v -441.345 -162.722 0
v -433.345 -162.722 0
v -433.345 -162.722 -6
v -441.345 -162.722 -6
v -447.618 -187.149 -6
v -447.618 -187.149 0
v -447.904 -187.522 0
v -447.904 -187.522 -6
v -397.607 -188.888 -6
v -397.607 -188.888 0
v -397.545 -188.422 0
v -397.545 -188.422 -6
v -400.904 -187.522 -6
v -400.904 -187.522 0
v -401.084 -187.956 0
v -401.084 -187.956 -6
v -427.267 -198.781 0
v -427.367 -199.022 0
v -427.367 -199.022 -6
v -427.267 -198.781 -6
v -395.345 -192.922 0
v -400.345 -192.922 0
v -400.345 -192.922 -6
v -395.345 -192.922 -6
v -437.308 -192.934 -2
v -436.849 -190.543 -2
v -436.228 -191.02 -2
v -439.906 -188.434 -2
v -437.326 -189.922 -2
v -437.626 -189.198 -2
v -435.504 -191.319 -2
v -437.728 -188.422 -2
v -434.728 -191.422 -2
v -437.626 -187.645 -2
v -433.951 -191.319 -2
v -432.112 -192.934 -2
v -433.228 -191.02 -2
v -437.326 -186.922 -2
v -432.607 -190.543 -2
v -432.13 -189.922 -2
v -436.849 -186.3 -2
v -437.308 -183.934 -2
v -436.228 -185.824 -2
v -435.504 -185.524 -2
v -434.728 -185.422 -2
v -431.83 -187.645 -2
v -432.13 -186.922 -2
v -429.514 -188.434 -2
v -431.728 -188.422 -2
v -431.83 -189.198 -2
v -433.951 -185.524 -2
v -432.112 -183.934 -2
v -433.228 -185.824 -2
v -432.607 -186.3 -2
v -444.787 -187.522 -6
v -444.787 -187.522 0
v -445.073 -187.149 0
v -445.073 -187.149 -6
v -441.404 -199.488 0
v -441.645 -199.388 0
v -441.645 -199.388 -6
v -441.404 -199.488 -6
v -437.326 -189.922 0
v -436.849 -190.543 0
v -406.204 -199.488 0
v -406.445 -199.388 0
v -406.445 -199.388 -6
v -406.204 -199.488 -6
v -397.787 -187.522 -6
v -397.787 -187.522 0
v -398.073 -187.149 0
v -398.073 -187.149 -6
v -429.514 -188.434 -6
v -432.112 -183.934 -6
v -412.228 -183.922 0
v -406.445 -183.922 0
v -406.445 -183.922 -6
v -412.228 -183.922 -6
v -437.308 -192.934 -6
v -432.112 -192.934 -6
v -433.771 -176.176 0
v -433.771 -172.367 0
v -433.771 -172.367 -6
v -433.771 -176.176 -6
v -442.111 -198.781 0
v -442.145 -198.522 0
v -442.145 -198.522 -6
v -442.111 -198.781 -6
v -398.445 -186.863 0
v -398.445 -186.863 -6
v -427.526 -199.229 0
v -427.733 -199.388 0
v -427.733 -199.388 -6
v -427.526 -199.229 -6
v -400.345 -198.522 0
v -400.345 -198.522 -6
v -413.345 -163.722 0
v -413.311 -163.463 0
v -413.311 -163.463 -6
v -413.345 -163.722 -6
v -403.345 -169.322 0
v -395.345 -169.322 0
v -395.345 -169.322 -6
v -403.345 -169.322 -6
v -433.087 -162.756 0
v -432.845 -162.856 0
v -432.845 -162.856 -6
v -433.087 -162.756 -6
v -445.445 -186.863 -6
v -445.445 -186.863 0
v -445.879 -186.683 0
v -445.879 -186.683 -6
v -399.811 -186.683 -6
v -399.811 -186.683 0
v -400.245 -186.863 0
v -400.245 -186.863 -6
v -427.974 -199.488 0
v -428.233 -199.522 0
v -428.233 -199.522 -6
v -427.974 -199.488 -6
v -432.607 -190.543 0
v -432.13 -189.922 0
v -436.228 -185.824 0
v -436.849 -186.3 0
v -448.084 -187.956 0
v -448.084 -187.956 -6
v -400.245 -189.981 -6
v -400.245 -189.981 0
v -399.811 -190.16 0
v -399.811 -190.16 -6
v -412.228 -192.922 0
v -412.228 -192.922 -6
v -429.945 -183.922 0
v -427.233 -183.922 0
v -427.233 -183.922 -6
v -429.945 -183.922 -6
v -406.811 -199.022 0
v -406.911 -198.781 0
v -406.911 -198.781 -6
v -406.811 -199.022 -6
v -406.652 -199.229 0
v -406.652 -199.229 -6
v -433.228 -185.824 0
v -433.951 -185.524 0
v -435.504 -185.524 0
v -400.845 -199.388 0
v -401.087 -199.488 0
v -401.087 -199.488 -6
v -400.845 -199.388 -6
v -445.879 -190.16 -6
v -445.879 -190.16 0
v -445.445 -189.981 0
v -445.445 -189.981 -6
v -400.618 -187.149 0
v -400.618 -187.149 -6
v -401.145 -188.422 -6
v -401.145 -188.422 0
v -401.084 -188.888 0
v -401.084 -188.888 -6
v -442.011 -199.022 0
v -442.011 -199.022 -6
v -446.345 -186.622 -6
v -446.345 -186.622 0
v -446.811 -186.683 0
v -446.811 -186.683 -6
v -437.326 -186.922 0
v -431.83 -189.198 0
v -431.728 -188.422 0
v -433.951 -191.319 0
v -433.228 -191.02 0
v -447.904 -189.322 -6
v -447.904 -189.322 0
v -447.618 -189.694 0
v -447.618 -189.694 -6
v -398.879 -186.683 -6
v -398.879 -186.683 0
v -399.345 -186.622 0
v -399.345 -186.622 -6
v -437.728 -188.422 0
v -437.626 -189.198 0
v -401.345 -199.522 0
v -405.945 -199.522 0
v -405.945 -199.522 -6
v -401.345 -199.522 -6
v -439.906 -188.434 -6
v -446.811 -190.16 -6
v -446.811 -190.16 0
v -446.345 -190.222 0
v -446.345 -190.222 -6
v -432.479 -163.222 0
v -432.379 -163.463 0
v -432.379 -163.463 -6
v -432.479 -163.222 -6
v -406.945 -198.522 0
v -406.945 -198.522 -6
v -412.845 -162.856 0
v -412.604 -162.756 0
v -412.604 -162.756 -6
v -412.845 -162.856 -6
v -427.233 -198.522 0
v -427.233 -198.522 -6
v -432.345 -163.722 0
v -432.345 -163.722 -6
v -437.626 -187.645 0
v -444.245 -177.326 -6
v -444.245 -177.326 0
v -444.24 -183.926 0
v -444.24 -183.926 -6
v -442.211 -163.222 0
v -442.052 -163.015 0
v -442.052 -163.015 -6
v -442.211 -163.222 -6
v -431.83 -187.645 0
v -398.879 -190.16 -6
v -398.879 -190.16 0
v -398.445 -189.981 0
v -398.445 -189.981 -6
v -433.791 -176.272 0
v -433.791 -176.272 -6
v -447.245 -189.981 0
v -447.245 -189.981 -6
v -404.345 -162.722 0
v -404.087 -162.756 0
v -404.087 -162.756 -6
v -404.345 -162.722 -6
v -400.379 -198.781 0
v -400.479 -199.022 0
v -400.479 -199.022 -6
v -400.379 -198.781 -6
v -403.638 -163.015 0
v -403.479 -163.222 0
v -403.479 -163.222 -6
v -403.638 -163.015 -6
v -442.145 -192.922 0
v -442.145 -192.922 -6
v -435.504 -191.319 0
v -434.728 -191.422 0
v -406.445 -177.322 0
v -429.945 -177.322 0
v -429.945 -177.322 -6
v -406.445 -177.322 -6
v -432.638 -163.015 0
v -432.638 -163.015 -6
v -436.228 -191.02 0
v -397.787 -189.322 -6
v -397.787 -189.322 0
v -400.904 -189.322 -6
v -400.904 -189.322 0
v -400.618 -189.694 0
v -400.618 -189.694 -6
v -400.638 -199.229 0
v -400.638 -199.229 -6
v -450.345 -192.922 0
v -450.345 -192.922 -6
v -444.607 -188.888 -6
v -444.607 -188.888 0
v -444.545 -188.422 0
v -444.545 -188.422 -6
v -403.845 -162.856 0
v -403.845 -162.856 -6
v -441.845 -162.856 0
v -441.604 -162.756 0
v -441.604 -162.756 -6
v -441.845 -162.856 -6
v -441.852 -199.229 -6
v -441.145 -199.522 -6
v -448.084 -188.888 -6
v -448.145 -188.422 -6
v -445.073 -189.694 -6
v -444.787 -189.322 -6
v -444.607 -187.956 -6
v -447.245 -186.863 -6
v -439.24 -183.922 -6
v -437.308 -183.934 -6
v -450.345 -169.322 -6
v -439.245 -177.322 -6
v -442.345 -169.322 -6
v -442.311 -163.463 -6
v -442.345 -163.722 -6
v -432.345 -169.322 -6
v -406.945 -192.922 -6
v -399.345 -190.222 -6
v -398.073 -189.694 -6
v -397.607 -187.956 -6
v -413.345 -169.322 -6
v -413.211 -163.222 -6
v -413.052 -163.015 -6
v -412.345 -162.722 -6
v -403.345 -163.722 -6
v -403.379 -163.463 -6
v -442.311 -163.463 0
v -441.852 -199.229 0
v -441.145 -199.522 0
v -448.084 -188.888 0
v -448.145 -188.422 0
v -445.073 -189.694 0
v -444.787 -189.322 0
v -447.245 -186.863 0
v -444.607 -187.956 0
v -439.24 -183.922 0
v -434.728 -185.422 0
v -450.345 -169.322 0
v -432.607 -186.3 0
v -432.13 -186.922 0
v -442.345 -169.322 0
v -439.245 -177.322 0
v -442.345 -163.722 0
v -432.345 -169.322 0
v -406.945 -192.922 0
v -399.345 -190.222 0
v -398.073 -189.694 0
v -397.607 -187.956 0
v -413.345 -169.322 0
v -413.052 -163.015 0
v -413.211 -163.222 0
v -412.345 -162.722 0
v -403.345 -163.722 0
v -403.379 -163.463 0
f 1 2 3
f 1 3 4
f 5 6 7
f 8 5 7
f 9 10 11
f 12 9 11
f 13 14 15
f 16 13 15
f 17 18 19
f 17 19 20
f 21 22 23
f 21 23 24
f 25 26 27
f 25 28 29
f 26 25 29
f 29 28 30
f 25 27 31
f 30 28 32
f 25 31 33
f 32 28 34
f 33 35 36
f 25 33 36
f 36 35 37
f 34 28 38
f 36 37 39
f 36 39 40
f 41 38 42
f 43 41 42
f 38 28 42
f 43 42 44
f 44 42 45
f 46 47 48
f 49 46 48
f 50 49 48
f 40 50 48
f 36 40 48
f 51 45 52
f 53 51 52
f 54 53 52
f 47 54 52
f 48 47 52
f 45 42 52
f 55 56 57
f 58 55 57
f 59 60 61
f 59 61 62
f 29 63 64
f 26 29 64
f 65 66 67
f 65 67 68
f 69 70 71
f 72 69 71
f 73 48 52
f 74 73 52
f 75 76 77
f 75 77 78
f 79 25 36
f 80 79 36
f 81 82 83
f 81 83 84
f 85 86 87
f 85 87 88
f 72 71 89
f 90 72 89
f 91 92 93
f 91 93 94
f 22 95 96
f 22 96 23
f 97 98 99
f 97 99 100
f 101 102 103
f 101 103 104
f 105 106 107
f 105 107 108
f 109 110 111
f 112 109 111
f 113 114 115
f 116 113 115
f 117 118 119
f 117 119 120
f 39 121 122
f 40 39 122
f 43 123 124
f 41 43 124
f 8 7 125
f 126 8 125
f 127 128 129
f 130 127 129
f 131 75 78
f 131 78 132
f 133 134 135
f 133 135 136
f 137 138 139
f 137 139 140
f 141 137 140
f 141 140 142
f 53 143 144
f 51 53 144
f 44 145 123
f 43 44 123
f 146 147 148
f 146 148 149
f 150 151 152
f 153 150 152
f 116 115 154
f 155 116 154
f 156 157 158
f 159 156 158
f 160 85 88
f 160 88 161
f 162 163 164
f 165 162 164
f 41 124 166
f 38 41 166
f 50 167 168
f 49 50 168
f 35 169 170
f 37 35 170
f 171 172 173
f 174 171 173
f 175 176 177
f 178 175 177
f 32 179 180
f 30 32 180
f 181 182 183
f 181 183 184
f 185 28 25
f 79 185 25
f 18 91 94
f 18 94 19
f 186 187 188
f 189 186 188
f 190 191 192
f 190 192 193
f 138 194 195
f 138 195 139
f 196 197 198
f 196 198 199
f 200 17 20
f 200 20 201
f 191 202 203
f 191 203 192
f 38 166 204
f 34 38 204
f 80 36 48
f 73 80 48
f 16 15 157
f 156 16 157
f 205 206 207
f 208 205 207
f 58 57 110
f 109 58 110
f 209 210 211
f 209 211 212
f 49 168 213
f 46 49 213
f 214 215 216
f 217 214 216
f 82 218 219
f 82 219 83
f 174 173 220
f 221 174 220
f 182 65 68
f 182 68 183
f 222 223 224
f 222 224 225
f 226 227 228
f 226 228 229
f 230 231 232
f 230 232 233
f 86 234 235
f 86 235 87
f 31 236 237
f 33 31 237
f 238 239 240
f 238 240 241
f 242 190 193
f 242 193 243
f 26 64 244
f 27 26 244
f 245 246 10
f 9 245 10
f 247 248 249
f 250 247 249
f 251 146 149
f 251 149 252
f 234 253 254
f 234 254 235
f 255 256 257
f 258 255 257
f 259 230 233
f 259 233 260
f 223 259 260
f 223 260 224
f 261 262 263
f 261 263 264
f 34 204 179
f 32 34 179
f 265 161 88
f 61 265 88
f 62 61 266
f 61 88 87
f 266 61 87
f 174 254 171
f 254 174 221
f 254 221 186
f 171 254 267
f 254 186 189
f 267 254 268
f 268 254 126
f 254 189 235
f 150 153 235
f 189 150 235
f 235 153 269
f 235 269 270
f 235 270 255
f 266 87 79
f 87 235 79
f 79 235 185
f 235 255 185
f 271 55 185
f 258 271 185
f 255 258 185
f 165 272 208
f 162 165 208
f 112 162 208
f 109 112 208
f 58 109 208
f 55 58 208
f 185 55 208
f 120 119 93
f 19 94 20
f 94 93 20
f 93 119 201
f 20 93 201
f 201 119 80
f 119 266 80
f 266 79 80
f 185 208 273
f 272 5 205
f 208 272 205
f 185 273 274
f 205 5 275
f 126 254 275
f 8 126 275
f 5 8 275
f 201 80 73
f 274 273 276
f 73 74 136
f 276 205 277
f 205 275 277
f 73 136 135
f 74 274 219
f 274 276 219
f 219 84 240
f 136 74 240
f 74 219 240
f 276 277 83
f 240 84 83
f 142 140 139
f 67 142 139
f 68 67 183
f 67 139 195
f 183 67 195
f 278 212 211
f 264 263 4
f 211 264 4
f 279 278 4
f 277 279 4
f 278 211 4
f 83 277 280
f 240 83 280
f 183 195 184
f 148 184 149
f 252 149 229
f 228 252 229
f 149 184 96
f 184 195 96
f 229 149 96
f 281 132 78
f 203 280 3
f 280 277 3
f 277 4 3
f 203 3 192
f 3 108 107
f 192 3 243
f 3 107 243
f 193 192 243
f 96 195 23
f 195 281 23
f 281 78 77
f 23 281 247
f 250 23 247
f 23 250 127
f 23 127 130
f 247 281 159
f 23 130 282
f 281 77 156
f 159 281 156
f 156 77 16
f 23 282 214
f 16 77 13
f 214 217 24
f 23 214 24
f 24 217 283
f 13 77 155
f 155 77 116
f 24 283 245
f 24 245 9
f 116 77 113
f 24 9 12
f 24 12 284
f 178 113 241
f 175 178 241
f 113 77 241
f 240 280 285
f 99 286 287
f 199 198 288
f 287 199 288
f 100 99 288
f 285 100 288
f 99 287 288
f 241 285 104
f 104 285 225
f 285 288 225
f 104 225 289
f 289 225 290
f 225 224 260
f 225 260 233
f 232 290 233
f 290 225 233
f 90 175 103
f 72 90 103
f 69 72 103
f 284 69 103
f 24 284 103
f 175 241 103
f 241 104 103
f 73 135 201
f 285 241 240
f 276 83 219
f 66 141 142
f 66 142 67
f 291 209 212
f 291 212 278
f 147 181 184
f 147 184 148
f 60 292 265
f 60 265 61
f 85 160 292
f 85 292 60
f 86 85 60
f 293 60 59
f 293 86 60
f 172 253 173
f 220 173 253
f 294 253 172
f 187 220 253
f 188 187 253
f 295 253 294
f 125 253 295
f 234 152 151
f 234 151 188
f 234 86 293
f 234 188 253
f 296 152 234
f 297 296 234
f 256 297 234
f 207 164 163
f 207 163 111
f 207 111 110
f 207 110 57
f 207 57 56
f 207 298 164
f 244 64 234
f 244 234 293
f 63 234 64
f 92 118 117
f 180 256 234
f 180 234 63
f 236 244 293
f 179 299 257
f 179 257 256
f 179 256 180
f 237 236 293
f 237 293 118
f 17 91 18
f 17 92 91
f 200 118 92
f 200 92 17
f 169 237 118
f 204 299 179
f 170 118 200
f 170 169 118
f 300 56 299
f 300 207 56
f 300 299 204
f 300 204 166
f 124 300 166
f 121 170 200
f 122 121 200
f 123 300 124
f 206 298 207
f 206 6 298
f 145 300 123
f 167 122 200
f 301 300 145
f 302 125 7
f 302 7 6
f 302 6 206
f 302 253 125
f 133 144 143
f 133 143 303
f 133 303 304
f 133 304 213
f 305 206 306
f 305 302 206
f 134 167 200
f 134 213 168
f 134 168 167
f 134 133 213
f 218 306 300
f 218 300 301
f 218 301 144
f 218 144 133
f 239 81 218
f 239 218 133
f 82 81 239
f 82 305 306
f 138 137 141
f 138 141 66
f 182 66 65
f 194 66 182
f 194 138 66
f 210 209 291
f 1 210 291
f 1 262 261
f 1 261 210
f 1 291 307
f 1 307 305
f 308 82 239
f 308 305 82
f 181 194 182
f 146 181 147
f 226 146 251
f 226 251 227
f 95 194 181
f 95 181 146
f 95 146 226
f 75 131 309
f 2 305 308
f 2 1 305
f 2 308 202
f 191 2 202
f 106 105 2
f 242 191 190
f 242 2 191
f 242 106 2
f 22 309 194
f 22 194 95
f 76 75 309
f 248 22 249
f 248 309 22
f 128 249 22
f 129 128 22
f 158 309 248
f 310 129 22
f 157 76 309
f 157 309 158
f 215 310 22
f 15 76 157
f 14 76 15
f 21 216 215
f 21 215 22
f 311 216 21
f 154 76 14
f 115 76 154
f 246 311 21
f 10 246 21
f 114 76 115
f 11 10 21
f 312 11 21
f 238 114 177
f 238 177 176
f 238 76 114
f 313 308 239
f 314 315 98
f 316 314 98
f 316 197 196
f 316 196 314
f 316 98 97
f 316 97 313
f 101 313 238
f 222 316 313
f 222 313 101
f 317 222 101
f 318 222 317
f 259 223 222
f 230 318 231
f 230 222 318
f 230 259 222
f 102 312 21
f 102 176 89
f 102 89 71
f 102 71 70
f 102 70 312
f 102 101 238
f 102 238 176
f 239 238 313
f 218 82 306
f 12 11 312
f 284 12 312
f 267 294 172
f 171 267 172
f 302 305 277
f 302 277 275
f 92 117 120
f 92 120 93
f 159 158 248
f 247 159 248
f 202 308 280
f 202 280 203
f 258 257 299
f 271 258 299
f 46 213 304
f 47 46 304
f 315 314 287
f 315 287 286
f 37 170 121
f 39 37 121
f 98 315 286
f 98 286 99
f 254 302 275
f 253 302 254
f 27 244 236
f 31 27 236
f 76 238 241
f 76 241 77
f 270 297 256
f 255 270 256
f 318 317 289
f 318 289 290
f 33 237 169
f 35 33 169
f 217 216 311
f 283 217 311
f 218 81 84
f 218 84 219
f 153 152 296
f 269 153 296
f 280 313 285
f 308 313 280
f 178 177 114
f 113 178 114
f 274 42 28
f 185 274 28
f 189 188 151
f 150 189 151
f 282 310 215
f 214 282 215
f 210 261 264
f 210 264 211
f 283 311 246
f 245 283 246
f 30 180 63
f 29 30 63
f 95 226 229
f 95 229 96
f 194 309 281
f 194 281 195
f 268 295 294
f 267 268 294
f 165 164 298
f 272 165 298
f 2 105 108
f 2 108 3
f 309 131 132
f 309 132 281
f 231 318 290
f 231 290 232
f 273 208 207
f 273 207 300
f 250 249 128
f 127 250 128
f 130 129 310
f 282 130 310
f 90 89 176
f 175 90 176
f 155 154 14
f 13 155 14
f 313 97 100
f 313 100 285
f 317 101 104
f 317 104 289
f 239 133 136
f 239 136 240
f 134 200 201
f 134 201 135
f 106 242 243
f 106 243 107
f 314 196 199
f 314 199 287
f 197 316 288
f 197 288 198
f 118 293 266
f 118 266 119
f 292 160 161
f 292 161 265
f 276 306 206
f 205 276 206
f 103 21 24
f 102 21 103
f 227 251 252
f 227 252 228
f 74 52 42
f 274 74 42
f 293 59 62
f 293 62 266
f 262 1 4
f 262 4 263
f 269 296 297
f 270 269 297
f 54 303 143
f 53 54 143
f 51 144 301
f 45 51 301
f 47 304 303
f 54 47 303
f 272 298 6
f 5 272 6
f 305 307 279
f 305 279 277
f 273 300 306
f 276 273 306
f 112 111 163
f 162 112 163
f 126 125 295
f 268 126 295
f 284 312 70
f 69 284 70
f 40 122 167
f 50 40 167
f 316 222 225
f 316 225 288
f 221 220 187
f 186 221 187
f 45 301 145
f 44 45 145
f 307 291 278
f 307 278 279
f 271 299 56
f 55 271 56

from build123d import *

# Parameters (mm, degrees)
BOSS_EXTRUDE1_DEPTH = 6
BOSS_EXTRUDE2_DEPTH = 2


with BuildPart() as part:
    # Sketch1 → Boss-Extrude1 (new body)
    with BuildSketch(Plane.XY):
        Polygon((-427.733097117, -199.387732928), (-427.525990336, -199.228814306), (-427.367071713, -199.021707525), (-427.267171291, -198.78052657), (-427.233097117, -198.521707525), (-427.233097117, -183.921707525), (-429.945372541, -183.921707525), (-429.945372541, -177.321707525), (-406.445372541, -177.321707525), (-406.445372541, -183.921707525), (-412.227908952, -183.921707525), (-412.227908952, -192.921707525), (-406.945372541, -192.921707525), (-406.945372541, -198.521707525), (-406.911298367, -198.78052657), (-406.811397945, -199.021707525), (-406.652479322, -199.228814306), (-406.445372541, -199.387732928), (-406.204191586, -199.487633351), (-405.945372541, -199.521707525), (-401.345372541, -199.521707525), (-401.086553496, -199.487633351), (-400.845372541, -199.387732928), (-400.63826576, -199.228814306), (-400.479347137, -199.021707525), (-400.379446715, -198.78052657), (-400.345372541, -198.521707525), (-400.345372541, -192.921707525), (-395.345372541, -192.921707525), (-395.345372541, -169.321707525), (-403.345372541, -169.321707525), (-403.345372541, -163.721707525), (-403.379446715, -163.46288848), (-403.479347137, -163.221707525), (-403.63826576, -163.014600744), (-403.845372541, -162.855682121), (-404.086553496, -162.755781698), (-404.345372541, -162.721707525), (-412.345372541, -162.721707525), (-412.604191586, -162.755781698), (-412.845372541, -162.855682121), (-413.052479322, -163.014600744), (-413.211397945, -163.221707525), (-413.311298367, -163.46288848), (-413.345372541, -163.721707525), (-413.345372541, -169.321707525), (-432.345372541, -169.321707525), (-432.345372541, -163.721707525), (-432.379446715, -163.46288848), (-432.479347137, -163.221707525), (-432.63826576, -163.014600744), (-432.845372541, -162.855682121), (-433.086553496, -162.755781698), (-433.345372541, -162.721707525), (-441.345372541, -162.721707525), (-441.604191586, -162.755781698), (-441.845372541, -162.855682121), (-442.052479322, -163.014600744), (-442.211397945, -163.221707525), (-442.311298367, -163.46288848), (-442.345372541, -163.721707525), (-442.345372541, -169.321707525), (-450.345372541, -169.321707525), (-450.345372541, -192.921707525), (-442.145372541, -192.921707525), (-442.145372541, -198.521707525), (-442.111298367, -198.78052657), (-442.011397945, -199.021707525), (-441.852479322, -199.228814306), (-441.645372541, -199.387732928), (-441.404191586, -199.487633351), (-441.145372541, -199.521707525), (-428.233097117, -199.521707525), (-427.974278072, -199.487633351), align=None)
        Polygon((-447.618164747, -187.148915319), (-447.245372541, -186.862861798), (-446.811246822, -186.683041037), (-446.345372541, -186.621707525), (-445.87949826, -186.683041037), (-445.445372541, -186.862861798), (-445.072580335, -187.148915319), (-444.786526814, -187.521707525), (-444.606706054, -187.955833244), (-444.545372541, -188.421707525), (-444.606706054, -188.887581806), (-444.786526814, -189.321707525), (-445.072580335, -189.694499731), (-445.445372541, -189.980553252), (-445.87949826, -190.160374012), (-446.345372541, -190.221707525), (-446.811246822, -190.160374012), (-447.245372541, -189.980553252), (-447.618164747, -189.694499731), (-447.904218268, -189.321707525), (-448.084039028, -188.887581806), (-448.145372541, -188.421707525), (-448.084039028, -187.955833244), (-447.904218268, -187.521707525), align=None, mode=Mode.SUBTRACT)
        Polygon((-432.11197341, -192.934124647), (-437.308125833, -192.934124647), (-439.906202044, -188.434124647), (-437.308125833, -183.934124647), (-432.11197341, -183.934124647), (-429.513897199, -188.434124647), align=None, mode=Mode.SUBTRACT)
        Polygon((-400.904218268, -187.521707525), (-400.618164747, -187.148915319), (-400.245372541, -186.862861798), (-399.811246822, -186.683041037), (-399.345372541, -186.621707525), (-398.87949826, -186.683041037), (-398.445372541, -186.862861798), (-398.072580335, -187.148915319), (-397.786526814, -187.521707525), (-397.606706054, -187.955833244), (-397.545372541, -188.421707525), (-397.606706054, -188.887581806), (-397.786526814, -189.321707525), (-398.072580335, -189.694499731), (-398.445372541, -189.980553252), (-398.87949826, -190.160374012), (-399.345372541, -190.221707525), (-399.811246822, -190.160374012), (-400.245372541, -189.980553252), (-400.618164747, -189.694499731), (-400.904218268, -189.321707525), (-401.084039028, -188.887581806), (-401.145372541, -188.421707525), (-401.084039028, -187.955833244), align=None, mode=Mode.SUBTRACT)
        Polygon((-439.245372541, -177.321707525), (-439.240180663, -183.921707525), (-444.240179116, -183.925640764), (-444.245370992, -177.325642806), align=None, mode=Mode.SUBTRACT)
        Polygon((-433.771349426, -172.366944559), (-433.771349426, -176.175776495), (-433.791446368, -176.271985766), align=None, mode=Mode.SUBTRACT)
    extrude(amount=-BOSS_EXTRUDE1_DEPTH)

    # Sketch1<3> → Boss-Extrude2 (add)
    with BuildSketch(Plane.XY):
        Polygon((-439.906202044, -188.434124647), (-437.308125833, -192.934124647), (-432.11197341, -192.934124647), (-429.513897199, -188.434124647), (-432.11197341, -183.934124647), (-437.308125833, -183.934124647), align=None)
        Polygon((-432.129832741, -189.921707525), (-432.606588608, -190.543027868), (-433.227908952, -191.019783736), (-433.951451817, -191.319485004), (-434.727908952, -191.421707525), (-435.504366087, -191.319485004), (-436.227908952, -191.019783736), (-436.849229296, -190.543027868), (-437.325985163, -189.921707525), (-437.625686431, -189.19816466), (-437.727908952, -188.421707525), (-437.625686431, -187.645250389), (-437.325985163, -186.921707525), (-436.849229296, -186.300387181), (-436.227908952, -185.823631313), (-435.504366087, -185.523930046), (-434.727908952, -185.421707525), (-433.951451817, -185.523930046), (-433.227908952, -185.823631313), (-432.606588608, -186.300387181), (-432.129832741, -186.921707525), (-431.830131473, -187.645250389), (-431.727908952, -188.421707525), (-431.830131473, -189.19816466), align=None, mode=Mode.SUBTRACT)
    extrude(amount=-BOSS_EXTRUDE2_DEPTH)


solid = part.part
